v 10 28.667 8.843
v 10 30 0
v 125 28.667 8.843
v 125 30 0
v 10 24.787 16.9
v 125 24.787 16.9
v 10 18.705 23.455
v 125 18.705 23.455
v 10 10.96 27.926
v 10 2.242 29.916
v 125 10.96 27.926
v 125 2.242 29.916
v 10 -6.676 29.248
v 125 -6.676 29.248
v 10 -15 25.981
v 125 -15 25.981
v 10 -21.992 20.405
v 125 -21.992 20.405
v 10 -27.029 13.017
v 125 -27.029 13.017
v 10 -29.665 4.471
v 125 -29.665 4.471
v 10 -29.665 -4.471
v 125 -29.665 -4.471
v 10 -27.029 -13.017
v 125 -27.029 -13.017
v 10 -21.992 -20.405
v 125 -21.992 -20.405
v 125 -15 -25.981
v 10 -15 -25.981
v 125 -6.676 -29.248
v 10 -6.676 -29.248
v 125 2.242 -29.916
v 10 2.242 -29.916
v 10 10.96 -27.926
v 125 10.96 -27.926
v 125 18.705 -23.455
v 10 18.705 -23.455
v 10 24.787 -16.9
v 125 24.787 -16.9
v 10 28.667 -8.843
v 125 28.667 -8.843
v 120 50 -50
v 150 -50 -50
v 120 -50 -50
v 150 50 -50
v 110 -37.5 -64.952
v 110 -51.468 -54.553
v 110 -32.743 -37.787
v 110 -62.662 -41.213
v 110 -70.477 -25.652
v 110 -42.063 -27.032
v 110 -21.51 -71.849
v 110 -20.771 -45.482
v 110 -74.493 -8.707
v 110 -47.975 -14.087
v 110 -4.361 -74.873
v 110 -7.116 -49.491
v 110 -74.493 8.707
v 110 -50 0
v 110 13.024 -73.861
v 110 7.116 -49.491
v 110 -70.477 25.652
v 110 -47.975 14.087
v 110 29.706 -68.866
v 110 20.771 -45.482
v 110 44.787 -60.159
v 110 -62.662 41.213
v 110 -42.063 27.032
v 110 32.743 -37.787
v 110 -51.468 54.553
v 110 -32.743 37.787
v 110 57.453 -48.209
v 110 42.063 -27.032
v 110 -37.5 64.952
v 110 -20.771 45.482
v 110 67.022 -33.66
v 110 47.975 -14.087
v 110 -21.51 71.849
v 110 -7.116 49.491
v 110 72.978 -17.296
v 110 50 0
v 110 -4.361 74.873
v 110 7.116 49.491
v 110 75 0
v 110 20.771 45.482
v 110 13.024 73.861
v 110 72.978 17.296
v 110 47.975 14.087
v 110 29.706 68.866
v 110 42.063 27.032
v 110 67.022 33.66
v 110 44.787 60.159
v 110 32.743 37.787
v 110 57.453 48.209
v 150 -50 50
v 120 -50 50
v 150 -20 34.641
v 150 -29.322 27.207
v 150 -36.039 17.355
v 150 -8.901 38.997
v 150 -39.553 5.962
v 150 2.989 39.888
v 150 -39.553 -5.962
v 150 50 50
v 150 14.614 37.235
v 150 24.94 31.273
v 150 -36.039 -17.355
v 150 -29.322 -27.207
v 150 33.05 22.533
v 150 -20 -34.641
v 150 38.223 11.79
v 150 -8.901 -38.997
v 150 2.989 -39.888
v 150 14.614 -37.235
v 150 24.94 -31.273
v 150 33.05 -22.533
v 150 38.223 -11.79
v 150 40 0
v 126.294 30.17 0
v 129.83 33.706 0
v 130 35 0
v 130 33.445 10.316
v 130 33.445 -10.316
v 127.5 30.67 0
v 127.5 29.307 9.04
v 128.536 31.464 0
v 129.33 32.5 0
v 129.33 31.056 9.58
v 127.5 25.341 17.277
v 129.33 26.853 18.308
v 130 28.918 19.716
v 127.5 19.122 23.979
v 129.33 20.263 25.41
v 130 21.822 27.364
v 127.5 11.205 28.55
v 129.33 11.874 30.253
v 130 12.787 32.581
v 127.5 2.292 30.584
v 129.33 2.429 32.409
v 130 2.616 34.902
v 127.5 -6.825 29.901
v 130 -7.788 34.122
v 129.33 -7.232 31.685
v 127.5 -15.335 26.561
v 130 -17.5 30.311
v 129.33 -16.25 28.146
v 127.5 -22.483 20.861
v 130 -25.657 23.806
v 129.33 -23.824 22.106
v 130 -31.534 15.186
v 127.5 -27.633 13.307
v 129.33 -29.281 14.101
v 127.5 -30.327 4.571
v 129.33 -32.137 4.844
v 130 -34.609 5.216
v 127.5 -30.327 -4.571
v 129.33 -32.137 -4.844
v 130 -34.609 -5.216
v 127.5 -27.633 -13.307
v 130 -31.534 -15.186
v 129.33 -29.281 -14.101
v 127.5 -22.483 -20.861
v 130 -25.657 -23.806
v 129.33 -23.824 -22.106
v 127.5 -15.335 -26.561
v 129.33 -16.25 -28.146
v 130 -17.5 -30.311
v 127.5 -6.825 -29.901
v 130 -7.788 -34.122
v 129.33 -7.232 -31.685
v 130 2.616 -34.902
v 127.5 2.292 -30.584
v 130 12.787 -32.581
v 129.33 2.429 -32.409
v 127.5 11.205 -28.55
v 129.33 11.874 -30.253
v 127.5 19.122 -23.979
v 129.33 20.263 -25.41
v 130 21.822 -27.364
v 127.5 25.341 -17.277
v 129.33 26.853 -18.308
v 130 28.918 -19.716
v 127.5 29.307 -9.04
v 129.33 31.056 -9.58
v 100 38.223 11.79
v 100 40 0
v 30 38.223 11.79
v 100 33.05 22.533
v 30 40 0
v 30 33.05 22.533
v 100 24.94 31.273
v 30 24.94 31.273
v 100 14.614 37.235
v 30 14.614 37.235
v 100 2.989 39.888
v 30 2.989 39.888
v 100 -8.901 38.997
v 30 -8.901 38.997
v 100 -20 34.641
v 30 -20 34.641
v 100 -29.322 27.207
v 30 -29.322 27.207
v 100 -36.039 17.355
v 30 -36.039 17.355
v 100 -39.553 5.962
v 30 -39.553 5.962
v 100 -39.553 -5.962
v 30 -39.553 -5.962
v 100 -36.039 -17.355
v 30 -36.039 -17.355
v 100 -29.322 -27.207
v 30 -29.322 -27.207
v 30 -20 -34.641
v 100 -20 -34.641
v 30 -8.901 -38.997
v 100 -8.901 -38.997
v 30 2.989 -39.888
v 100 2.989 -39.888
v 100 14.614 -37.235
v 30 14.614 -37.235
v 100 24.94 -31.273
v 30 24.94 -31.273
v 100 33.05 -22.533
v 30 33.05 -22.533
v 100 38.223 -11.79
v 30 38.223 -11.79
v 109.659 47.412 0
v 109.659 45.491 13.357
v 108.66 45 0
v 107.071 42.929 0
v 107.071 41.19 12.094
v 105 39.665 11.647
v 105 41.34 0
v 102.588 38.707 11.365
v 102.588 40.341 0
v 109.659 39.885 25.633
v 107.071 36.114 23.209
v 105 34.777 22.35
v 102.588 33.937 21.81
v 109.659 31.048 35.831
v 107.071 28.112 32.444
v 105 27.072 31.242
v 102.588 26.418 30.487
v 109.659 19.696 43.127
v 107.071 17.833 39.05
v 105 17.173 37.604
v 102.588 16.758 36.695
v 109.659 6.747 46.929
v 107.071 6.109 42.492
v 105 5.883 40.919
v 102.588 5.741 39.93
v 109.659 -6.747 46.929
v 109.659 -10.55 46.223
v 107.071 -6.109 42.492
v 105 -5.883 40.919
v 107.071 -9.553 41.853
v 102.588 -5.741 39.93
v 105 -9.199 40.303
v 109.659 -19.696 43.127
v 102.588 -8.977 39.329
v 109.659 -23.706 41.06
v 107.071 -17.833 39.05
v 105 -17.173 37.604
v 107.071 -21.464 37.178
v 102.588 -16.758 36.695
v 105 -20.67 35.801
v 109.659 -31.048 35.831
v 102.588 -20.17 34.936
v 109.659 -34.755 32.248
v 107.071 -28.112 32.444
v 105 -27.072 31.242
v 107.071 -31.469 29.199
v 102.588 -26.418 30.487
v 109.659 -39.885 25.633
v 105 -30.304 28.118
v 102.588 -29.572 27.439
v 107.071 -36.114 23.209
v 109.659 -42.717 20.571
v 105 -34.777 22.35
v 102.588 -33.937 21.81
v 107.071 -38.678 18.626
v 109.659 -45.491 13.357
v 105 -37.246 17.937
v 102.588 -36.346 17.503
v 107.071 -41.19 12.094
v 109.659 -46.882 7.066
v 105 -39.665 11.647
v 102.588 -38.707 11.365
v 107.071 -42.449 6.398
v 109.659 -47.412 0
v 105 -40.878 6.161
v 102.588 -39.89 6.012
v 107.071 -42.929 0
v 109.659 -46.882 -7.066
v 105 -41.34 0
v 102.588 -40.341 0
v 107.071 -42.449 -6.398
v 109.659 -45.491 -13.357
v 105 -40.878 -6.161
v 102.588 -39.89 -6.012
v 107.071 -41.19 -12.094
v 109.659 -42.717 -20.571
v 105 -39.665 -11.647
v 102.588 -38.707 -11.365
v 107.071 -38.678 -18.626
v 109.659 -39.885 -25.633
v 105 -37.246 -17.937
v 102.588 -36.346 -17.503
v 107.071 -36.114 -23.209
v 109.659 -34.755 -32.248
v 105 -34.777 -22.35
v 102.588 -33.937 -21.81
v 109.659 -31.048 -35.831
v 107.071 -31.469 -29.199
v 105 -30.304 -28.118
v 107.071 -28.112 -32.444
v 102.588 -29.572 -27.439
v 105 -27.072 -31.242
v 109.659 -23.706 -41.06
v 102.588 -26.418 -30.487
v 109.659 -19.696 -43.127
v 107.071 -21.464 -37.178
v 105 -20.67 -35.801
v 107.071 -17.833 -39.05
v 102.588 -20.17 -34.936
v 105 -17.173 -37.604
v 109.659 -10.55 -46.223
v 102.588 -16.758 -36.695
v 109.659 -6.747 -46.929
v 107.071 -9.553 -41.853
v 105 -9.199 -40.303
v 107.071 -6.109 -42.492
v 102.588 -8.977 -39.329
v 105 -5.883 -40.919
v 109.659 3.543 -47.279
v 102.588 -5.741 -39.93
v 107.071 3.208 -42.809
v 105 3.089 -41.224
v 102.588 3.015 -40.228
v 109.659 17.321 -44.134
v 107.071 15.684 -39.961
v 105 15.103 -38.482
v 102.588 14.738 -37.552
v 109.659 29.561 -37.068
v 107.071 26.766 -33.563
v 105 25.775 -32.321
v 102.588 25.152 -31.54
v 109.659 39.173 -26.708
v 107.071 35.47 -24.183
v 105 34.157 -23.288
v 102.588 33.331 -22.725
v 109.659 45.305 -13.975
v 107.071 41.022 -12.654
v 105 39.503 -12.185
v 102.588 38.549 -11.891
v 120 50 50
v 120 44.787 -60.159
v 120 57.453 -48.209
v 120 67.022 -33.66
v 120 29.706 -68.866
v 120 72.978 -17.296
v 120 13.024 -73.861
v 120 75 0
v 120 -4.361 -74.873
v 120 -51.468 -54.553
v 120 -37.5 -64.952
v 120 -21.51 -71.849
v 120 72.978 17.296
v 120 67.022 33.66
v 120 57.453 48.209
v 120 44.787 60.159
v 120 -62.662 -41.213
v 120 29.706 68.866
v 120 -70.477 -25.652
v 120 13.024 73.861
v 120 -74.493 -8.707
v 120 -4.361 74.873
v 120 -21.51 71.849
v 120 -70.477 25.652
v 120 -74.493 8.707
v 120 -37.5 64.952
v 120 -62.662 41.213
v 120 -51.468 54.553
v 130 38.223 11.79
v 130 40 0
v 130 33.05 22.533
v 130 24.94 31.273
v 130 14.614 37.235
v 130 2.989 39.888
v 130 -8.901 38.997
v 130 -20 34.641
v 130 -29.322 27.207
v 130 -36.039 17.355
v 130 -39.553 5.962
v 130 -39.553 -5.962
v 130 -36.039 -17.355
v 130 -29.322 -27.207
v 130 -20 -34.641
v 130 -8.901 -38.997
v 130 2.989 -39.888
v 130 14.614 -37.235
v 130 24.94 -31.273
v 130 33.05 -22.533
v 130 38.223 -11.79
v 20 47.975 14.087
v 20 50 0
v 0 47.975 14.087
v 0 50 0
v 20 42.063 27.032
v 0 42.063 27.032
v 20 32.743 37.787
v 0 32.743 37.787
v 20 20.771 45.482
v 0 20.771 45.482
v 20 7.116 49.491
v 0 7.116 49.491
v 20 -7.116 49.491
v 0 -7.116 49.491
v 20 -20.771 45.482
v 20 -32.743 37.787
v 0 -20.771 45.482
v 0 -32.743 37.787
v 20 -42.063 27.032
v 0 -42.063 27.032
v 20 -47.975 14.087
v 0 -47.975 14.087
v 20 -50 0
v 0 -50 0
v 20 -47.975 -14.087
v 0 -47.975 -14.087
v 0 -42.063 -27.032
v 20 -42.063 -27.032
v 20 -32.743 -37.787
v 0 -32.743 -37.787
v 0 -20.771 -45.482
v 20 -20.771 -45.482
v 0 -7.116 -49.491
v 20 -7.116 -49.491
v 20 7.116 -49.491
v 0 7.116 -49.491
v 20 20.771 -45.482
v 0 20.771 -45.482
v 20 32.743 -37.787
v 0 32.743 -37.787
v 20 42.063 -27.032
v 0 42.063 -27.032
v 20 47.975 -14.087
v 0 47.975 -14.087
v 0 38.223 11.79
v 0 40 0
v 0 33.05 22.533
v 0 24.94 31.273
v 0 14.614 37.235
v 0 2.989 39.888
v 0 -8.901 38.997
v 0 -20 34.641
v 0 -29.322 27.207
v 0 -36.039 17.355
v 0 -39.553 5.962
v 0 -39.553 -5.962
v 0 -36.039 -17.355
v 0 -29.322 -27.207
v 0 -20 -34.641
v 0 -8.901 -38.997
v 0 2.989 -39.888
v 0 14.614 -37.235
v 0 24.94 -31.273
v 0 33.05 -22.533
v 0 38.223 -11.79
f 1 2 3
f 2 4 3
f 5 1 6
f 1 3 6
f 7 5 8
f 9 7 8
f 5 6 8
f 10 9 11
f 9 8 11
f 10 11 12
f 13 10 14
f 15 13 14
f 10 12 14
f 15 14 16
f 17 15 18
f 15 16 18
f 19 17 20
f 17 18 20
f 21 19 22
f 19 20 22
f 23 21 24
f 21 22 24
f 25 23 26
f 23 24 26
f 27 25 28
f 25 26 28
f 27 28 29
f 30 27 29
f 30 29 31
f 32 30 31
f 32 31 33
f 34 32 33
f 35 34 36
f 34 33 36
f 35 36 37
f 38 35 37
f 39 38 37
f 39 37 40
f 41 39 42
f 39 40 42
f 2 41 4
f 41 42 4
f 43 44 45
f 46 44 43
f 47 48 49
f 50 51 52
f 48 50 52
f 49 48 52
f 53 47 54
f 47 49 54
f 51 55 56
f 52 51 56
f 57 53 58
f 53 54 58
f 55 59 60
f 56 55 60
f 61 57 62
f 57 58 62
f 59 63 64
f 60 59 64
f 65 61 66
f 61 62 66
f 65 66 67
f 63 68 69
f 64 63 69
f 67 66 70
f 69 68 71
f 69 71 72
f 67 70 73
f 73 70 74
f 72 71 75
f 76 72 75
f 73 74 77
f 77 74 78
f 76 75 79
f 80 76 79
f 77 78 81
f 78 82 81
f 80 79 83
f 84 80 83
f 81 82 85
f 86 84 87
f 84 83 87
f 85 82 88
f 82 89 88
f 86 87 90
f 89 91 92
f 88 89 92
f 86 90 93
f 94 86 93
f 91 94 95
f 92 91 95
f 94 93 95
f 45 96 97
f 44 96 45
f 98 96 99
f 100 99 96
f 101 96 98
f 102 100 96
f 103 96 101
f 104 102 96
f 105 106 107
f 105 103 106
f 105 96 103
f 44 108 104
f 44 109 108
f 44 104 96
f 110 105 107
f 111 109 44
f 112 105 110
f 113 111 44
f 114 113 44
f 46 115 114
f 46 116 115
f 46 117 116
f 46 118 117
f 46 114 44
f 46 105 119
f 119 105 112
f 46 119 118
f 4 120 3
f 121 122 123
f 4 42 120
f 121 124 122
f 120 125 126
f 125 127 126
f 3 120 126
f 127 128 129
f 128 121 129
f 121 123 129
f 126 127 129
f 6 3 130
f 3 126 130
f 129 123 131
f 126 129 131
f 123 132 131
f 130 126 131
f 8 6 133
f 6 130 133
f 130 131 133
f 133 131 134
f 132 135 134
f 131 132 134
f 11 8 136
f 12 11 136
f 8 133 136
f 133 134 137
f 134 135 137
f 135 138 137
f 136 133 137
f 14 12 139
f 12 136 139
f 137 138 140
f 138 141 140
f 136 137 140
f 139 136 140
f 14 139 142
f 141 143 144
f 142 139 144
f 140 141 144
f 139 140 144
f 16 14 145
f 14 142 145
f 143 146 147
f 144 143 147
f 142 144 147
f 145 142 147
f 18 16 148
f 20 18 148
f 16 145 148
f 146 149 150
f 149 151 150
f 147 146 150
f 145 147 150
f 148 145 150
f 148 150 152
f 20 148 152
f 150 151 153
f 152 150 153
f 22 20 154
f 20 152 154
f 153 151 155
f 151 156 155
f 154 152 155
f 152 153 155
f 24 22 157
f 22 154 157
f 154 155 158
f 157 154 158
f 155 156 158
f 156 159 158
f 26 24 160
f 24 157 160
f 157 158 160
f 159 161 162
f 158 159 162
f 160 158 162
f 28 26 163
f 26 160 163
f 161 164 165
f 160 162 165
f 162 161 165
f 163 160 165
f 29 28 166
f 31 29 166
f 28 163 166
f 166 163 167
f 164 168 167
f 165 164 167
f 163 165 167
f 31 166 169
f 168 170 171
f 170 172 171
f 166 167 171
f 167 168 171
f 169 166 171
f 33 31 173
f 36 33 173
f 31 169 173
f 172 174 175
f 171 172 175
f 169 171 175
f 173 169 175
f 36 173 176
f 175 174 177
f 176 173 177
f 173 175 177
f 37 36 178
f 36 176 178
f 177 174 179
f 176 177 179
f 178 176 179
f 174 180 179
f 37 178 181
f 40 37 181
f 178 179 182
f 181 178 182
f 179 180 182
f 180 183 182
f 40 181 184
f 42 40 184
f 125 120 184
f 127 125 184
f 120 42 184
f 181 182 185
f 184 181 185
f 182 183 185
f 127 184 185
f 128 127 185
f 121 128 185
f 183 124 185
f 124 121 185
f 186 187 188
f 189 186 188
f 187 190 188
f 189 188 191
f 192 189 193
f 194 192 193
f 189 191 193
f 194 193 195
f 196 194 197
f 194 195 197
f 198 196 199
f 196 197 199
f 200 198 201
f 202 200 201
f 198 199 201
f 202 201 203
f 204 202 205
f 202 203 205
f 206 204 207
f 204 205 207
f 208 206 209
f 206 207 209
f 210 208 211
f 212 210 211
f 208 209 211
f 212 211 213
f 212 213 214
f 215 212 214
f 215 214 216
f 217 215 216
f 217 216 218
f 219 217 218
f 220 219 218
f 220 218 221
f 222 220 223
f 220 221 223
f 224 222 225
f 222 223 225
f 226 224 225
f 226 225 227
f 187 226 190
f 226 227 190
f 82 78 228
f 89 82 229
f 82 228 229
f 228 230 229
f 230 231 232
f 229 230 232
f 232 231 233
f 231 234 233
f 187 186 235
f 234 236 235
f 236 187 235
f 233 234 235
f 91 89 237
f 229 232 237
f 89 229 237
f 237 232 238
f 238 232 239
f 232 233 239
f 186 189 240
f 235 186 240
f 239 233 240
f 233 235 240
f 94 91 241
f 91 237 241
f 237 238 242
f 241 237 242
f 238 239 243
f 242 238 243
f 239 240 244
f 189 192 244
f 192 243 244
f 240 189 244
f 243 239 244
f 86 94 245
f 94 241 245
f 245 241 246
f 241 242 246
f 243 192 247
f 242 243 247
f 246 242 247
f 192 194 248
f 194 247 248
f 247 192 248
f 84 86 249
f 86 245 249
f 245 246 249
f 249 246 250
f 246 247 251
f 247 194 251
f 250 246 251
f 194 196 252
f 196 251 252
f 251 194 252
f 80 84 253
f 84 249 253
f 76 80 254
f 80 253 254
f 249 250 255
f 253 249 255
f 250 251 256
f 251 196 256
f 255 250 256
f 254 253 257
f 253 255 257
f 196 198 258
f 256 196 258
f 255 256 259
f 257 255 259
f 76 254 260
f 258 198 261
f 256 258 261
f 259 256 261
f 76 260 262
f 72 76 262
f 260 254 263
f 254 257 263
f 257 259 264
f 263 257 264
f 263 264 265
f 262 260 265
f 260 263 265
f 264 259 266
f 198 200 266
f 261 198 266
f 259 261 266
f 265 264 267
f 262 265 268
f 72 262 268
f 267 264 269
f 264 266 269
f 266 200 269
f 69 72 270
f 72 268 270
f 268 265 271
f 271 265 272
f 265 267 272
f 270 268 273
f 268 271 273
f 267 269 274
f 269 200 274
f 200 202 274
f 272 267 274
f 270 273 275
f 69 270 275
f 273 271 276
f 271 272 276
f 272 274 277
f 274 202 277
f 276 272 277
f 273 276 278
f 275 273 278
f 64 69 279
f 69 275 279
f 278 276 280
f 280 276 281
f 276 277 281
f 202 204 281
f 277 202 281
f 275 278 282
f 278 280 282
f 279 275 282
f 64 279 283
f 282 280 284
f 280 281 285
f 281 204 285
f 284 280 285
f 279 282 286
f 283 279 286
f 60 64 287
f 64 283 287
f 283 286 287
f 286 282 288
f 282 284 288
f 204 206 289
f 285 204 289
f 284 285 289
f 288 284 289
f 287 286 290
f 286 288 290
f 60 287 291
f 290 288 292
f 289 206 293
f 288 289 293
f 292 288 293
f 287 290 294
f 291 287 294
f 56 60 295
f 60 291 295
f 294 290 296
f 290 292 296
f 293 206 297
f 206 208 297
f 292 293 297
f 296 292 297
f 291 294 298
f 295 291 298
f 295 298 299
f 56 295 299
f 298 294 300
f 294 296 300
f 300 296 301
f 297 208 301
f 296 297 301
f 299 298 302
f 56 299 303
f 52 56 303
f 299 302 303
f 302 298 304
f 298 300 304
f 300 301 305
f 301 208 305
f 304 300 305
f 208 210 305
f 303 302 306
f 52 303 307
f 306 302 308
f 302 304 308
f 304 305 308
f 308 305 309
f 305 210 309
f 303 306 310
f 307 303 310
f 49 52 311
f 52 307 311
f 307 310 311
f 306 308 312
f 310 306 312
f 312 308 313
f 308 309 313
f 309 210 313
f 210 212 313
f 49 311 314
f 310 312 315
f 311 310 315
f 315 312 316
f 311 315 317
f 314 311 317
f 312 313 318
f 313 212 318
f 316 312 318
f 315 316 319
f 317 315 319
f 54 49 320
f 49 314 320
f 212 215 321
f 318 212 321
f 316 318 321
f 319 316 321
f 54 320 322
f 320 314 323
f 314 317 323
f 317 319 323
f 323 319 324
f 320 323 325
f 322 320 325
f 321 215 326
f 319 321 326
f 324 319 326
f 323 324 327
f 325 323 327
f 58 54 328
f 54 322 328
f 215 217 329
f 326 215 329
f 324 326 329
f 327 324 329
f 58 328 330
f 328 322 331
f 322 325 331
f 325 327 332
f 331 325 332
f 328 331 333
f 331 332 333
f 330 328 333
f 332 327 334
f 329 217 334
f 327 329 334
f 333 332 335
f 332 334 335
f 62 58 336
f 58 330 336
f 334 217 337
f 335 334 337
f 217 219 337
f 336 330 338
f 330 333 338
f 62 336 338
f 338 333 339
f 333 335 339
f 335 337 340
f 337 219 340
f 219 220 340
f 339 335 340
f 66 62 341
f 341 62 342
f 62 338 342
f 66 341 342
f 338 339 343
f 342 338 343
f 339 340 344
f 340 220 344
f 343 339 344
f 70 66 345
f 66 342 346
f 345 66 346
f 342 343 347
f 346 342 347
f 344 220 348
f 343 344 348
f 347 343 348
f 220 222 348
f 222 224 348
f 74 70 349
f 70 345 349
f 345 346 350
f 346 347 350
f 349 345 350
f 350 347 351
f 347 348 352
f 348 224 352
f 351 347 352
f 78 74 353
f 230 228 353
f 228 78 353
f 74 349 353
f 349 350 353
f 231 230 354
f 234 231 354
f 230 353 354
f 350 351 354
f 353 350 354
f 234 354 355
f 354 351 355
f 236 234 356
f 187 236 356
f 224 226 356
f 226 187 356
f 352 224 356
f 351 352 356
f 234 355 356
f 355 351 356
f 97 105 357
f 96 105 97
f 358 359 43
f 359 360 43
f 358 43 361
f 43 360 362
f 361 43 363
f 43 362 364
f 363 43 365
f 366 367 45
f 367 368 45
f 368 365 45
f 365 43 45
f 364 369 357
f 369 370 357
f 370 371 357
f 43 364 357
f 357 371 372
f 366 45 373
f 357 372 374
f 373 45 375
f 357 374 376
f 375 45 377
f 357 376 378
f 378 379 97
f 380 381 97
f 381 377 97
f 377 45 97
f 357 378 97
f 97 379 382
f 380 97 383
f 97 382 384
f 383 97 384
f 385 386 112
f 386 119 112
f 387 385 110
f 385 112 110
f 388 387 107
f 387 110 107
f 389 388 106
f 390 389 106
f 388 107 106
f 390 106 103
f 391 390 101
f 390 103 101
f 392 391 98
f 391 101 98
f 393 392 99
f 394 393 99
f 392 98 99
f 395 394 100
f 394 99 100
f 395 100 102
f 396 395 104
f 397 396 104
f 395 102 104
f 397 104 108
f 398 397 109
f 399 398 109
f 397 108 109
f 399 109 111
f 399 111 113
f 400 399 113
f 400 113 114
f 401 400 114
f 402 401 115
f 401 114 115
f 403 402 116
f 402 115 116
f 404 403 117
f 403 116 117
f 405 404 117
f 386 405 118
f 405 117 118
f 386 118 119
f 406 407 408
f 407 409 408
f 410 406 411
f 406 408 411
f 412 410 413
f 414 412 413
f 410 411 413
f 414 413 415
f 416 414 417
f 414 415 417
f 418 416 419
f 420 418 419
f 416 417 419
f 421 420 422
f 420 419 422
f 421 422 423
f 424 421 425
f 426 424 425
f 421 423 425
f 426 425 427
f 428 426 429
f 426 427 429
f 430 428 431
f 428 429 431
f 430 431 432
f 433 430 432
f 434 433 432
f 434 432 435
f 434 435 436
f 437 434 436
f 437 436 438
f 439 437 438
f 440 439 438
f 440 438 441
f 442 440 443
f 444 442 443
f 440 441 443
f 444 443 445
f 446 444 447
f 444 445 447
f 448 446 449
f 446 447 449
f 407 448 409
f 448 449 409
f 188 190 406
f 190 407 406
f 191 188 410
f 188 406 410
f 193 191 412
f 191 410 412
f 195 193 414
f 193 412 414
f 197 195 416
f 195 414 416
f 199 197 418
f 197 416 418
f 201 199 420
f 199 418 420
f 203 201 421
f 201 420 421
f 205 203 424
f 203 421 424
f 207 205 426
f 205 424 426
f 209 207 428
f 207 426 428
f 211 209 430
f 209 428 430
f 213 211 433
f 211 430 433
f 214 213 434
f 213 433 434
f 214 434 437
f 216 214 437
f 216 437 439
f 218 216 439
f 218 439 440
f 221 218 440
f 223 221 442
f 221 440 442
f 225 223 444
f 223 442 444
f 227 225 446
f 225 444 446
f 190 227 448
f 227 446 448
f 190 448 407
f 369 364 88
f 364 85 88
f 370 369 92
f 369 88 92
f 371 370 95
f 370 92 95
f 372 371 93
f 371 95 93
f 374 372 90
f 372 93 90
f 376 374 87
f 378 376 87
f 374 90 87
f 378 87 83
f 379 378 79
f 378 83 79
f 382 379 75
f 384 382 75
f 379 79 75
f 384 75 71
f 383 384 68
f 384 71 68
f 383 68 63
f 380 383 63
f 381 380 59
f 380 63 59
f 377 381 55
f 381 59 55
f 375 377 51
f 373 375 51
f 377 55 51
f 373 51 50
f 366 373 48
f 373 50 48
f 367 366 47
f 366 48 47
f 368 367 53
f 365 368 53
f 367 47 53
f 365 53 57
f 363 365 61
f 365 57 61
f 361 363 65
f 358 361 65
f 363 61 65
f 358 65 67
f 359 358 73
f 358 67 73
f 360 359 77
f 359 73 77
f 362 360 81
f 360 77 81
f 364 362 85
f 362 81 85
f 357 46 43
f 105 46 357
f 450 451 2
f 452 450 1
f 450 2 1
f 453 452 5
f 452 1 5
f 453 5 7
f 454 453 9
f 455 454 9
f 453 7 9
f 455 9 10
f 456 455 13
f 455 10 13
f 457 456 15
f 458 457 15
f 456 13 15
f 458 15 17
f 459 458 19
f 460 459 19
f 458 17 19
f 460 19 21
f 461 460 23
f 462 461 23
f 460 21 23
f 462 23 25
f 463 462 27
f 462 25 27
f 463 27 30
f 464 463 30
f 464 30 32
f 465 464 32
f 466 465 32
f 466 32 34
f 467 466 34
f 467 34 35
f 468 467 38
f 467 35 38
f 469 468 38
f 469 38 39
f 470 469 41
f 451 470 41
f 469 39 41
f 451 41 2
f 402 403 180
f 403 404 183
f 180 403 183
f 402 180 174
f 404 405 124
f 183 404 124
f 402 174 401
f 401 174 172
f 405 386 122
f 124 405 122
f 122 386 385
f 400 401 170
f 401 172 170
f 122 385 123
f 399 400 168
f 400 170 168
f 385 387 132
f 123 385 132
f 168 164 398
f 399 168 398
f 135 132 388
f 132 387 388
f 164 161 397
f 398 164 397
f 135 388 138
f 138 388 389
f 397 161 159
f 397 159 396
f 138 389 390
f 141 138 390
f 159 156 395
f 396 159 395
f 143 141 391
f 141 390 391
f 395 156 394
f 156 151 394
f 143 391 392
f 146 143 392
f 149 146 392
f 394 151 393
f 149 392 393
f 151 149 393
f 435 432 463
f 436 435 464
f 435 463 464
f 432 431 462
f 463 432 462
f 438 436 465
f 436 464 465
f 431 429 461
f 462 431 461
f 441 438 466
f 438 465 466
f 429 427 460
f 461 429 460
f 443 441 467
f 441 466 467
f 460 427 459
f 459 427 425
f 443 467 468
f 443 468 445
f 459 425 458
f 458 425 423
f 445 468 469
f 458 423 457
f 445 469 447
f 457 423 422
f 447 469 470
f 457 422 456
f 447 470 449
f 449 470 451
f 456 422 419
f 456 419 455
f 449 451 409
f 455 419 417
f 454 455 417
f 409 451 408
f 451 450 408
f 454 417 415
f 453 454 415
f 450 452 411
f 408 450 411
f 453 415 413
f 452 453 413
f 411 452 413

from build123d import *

# Parameters (mm, degrees)
RESSALTO_EXTRUS_O1_DEPTH = 30


with BuildPart() as part:
    # Esboço1 → Revolução1 (revolve)
    with BuildSketch(Plane.XY):
        with BuildLine():
            Line((0, 40), (10, 30))
            Line((10, 30), (125, 30))
            ThreePointArc((125, 30), (128.535533906, 31.464466094), (130, 35))
            Line((130, 35), (130, 40))
            Line((130, 40), (150, 40))
            Line((150, 40), (150, 50))
            Line((150, 50), (120, 50))
            Line((120, 50), (120, 75))
            Line((120, 75), (110, 75))
            Line((110, 75), (110, 50))
            ThreePointArc((110, 50), (107.071067812, 42.928932188), (100, 40))
            Line((100, 40), (30, 40))
            Line((30, 40), (20, 50))
            Line((20, 50), (0, 50))
            Line((0, 50), (0, 40))
        make_face()
    revolve(axis=Axis((0, 0, 0), (1, 0, 0)))

    # Esboço2 → Ressalto-extrusão1 (add)
    with BuildSketch(Plane(origin=(150, 0, 0), x_dir=(0, 0, -1), z_dir=(1, 0, 0))):
        with BuildLine():
            Line((-50, 50), (-50, 2.4e-08))
            ThreePointArc((-50, 2.4e-08), (-35.355339059, 35.35533906), (-2.3e-08, 50))
            Line((-2.3e-08, 50), (-50, 50))
        make_face()
        with BuildLine():
            Line((-50, 2.4e-08), (-50, -50))
            Line((-50, -50), (2.3e-08, -50))
            ThreePointArc((2.3e-08, -50), (-35.35533906, -35.355339059), (-50, 2.4e-08))
        make_face()
        with BuildLine():
            ThreePointArc((50, 0), (35.355339067, -35.355339051), (2.3e-08, -50))
            Line((2.3e-08, -50), (50, -50))
            Line((50, -50), (50, 0))
        make_face()
        with BuildLine():
            ThreePointArc((-2.3e-08, 50), (35.355339051, 35.355339067), (50, 0))
            Line((50, 0), (50, 50))
            Line((50, 50), (-2.3e-08, 50))
        make_face()
    extrude(amount=-RESSALTO_EXTRUS_O1_DEPTH)


solid = part.part
